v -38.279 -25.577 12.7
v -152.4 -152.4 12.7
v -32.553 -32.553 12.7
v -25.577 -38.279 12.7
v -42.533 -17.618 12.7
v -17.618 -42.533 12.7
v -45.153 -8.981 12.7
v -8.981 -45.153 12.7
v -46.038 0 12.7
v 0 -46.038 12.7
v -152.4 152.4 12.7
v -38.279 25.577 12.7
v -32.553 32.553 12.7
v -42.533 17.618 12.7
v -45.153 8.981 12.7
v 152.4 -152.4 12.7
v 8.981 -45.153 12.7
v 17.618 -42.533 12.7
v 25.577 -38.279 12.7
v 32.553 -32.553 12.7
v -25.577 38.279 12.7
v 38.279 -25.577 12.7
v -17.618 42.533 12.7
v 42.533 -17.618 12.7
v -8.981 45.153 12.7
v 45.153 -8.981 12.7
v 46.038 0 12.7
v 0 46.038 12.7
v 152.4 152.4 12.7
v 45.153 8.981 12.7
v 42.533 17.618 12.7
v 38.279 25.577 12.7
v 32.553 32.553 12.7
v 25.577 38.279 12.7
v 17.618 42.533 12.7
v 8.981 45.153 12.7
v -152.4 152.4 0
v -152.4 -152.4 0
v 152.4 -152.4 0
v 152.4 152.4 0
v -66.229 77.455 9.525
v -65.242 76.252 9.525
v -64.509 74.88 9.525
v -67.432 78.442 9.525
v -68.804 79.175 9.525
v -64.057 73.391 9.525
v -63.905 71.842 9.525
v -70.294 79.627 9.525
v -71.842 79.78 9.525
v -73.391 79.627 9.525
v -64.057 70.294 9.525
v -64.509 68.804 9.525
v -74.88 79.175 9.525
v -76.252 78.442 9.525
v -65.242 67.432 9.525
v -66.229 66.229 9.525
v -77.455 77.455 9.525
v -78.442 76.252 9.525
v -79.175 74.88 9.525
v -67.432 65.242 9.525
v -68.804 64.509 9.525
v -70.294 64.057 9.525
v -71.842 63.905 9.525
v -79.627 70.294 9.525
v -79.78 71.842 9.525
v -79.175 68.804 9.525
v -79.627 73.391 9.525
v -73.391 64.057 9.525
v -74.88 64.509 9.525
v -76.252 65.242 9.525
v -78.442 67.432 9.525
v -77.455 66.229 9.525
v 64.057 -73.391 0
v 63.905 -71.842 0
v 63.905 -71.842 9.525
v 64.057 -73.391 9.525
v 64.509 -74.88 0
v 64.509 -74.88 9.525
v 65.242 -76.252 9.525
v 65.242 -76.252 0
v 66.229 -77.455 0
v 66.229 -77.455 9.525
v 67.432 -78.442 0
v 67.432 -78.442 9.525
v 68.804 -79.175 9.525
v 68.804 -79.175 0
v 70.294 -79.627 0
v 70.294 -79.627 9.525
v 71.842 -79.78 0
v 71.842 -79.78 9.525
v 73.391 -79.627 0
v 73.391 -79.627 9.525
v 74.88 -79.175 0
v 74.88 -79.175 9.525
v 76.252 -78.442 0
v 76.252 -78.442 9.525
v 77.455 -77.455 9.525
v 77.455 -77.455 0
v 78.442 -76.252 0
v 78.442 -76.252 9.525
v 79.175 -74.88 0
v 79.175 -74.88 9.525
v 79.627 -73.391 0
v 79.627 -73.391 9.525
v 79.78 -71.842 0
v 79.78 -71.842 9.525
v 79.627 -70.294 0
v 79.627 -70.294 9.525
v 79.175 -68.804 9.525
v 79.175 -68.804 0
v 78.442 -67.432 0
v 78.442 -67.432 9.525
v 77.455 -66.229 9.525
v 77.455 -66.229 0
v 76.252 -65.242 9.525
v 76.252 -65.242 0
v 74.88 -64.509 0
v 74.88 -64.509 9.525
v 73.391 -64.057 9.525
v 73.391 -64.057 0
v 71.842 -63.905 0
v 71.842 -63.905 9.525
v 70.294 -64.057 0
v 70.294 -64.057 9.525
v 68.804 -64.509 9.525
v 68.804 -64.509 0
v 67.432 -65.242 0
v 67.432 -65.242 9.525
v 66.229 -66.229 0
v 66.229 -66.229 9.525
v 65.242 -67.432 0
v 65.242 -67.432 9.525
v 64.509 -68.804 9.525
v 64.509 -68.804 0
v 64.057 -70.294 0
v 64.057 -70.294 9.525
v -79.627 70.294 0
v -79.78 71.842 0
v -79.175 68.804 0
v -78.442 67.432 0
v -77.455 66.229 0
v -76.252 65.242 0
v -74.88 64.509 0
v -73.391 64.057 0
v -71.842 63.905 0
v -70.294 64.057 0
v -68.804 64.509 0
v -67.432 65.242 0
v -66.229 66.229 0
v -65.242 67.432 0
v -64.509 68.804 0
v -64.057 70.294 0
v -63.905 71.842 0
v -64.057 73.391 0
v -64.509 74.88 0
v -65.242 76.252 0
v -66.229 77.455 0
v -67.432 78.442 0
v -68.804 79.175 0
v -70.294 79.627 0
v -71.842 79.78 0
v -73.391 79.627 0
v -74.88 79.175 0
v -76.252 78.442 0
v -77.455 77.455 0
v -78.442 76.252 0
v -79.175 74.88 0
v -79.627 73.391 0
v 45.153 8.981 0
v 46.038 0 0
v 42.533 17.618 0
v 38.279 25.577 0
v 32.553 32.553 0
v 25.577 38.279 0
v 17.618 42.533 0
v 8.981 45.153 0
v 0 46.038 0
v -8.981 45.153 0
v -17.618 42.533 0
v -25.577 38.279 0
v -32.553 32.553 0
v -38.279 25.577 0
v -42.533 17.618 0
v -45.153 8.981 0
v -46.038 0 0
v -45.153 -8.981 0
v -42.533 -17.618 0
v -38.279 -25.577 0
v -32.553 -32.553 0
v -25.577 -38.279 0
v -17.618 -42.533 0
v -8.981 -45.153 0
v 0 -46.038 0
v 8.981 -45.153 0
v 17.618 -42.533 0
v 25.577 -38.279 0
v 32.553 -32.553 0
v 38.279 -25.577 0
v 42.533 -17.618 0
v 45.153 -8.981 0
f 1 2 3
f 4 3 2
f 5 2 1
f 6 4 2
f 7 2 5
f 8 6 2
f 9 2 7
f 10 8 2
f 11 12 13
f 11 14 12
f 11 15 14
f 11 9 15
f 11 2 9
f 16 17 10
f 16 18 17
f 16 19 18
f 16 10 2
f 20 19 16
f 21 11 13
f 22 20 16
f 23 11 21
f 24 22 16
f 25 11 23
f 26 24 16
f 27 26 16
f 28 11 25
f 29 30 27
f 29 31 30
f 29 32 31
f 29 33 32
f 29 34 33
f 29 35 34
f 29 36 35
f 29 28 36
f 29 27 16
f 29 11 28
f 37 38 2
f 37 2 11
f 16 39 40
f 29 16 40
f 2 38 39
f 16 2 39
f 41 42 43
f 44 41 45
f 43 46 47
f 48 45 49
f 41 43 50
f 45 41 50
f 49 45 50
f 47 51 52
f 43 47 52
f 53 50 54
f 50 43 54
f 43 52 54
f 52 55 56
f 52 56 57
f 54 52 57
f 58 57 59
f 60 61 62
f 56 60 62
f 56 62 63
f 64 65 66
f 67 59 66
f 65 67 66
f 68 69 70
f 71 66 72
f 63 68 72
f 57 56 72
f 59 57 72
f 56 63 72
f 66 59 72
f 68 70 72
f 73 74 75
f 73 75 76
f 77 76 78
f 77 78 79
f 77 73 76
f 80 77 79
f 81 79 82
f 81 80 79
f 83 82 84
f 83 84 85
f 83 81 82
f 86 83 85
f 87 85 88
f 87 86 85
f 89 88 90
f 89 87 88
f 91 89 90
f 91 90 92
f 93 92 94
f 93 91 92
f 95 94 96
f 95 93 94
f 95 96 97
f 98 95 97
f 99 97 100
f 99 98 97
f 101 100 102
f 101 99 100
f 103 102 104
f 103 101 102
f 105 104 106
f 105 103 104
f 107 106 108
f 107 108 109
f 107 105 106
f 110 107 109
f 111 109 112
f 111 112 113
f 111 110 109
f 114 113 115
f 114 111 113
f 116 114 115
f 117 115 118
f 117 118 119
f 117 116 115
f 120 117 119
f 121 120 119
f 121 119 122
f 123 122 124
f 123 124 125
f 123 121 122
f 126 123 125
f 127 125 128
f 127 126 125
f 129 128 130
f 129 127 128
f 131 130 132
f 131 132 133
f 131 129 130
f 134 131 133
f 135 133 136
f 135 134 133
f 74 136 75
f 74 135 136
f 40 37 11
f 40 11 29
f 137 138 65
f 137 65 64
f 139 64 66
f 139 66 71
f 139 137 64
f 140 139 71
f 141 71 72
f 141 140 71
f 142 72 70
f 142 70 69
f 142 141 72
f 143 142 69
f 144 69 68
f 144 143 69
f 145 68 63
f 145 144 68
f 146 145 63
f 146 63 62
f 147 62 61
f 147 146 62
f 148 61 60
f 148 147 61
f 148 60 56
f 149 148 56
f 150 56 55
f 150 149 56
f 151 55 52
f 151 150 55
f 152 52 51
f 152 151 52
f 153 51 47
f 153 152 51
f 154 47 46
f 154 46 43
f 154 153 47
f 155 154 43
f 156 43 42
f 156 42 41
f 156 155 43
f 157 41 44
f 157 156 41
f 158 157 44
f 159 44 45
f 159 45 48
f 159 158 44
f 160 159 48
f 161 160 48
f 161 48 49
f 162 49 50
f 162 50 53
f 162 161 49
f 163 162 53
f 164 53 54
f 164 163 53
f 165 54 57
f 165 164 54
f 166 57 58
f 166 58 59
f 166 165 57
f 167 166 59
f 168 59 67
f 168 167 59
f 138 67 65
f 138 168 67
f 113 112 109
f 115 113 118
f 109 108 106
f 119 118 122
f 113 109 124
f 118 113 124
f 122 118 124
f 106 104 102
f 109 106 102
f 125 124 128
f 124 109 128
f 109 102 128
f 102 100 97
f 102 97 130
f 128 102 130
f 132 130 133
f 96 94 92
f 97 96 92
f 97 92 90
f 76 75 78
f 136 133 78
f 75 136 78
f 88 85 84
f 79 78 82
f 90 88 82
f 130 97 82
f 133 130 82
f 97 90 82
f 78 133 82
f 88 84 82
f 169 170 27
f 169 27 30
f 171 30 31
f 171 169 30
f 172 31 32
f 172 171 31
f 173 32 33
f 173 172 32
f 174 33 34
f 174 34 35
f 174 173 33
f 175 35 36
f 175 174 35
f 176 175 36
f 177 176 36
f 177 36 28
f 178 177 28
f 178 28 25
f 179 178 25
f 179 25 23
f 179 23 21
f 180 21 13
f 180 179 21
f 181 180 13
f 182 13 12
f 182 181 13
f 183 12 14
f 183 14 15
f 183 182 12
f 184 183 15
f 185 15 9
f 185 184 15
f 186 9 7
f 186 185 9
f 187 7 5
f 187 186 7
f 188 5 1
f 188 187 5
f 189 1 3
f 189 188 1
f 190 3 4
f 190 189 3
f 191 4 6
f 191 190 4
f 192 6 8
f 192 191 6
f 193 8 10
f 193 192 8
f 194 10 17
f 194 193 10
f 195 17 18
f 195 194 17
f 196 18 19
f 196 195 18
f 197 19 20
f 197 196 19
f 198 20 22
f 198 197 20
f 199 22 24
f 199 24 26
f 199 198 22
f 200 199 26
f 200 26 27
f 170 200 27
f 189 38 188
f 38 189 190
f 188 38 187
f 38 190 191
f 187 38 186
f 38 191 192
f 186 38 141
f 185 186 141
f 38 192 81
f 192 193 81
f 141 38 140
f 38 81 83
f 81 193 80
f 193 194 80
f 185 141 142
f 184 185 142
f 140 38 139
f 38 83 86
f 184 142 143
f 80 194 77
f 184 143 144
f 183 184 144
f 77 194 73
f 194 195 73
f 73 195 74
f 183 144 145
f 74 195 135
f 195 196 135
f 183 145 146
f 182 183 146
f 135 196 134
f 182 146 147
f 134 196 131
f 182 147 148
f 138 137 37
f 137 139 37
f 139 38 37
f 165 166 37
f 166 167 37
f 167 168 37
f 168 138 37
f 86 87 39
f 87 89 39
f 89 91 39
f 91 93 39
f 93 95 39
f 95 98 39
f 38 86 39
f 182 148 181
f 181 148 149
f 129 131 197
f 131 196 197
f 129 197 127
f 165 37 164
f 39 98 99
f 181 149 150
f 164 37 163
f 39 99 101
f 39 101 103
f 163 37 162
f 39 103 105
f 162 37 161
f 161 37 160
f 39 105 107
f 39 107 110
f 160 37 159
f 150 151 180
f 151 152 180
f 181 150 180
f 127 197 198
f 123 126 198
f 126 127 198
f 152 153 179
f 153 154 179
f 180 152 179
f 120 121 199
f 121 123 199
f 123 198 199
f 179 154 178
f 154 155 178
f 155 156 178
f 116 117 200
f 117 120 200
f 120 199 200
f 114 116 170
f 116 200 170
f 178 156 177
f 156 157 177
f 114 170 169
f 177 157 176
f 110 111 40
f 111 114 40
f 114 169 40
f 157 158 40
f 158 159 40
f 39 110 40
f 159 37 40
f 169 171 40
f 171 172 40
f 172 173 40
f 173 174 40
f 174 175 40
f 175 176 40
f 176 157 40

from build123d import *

# Parameters (mm, degrees)
SKETCH1_W           = 304.8
SKETCH1_H           = 304.8
SKETCH1_R           = 46.0375
BOSS_EXTRUDE1_DEPTH = 12.7
SKETCH2_R           = 7.9375
CUT_EXTRUDE1_DEPTH  = 9.525


with BuildPart() as part:
    # Sketch1 → Boss-Extrude1 (new body)
    with BuildSketch(Plane.XY):
        Rectangle(SKETCH1_W, SKETCH1_H)
        Circle(SKETCH1_R, mode=Mode.SUBTRACT)
    extrude(amount=BOSS_EXTRUDE1_DEPTH)

    # Sketch2 → Cut-Extrude1 (cut)
    with BuildSketch(Plane.XY):
        with Locations(Location((-71.842048969, 71.842048969, 0), (0, 0, 180))):
            Circle(SKETCH2_R)
        with Locations(Location((71.842048969, -71.842048969, 0), (0, 0, 180))):
            Circle(SKETCH2_R)
    extrude(amount=CUT_EXTRUDE1_DEPTH, mode=Mode.SUBTRACT)


solid = part.part
